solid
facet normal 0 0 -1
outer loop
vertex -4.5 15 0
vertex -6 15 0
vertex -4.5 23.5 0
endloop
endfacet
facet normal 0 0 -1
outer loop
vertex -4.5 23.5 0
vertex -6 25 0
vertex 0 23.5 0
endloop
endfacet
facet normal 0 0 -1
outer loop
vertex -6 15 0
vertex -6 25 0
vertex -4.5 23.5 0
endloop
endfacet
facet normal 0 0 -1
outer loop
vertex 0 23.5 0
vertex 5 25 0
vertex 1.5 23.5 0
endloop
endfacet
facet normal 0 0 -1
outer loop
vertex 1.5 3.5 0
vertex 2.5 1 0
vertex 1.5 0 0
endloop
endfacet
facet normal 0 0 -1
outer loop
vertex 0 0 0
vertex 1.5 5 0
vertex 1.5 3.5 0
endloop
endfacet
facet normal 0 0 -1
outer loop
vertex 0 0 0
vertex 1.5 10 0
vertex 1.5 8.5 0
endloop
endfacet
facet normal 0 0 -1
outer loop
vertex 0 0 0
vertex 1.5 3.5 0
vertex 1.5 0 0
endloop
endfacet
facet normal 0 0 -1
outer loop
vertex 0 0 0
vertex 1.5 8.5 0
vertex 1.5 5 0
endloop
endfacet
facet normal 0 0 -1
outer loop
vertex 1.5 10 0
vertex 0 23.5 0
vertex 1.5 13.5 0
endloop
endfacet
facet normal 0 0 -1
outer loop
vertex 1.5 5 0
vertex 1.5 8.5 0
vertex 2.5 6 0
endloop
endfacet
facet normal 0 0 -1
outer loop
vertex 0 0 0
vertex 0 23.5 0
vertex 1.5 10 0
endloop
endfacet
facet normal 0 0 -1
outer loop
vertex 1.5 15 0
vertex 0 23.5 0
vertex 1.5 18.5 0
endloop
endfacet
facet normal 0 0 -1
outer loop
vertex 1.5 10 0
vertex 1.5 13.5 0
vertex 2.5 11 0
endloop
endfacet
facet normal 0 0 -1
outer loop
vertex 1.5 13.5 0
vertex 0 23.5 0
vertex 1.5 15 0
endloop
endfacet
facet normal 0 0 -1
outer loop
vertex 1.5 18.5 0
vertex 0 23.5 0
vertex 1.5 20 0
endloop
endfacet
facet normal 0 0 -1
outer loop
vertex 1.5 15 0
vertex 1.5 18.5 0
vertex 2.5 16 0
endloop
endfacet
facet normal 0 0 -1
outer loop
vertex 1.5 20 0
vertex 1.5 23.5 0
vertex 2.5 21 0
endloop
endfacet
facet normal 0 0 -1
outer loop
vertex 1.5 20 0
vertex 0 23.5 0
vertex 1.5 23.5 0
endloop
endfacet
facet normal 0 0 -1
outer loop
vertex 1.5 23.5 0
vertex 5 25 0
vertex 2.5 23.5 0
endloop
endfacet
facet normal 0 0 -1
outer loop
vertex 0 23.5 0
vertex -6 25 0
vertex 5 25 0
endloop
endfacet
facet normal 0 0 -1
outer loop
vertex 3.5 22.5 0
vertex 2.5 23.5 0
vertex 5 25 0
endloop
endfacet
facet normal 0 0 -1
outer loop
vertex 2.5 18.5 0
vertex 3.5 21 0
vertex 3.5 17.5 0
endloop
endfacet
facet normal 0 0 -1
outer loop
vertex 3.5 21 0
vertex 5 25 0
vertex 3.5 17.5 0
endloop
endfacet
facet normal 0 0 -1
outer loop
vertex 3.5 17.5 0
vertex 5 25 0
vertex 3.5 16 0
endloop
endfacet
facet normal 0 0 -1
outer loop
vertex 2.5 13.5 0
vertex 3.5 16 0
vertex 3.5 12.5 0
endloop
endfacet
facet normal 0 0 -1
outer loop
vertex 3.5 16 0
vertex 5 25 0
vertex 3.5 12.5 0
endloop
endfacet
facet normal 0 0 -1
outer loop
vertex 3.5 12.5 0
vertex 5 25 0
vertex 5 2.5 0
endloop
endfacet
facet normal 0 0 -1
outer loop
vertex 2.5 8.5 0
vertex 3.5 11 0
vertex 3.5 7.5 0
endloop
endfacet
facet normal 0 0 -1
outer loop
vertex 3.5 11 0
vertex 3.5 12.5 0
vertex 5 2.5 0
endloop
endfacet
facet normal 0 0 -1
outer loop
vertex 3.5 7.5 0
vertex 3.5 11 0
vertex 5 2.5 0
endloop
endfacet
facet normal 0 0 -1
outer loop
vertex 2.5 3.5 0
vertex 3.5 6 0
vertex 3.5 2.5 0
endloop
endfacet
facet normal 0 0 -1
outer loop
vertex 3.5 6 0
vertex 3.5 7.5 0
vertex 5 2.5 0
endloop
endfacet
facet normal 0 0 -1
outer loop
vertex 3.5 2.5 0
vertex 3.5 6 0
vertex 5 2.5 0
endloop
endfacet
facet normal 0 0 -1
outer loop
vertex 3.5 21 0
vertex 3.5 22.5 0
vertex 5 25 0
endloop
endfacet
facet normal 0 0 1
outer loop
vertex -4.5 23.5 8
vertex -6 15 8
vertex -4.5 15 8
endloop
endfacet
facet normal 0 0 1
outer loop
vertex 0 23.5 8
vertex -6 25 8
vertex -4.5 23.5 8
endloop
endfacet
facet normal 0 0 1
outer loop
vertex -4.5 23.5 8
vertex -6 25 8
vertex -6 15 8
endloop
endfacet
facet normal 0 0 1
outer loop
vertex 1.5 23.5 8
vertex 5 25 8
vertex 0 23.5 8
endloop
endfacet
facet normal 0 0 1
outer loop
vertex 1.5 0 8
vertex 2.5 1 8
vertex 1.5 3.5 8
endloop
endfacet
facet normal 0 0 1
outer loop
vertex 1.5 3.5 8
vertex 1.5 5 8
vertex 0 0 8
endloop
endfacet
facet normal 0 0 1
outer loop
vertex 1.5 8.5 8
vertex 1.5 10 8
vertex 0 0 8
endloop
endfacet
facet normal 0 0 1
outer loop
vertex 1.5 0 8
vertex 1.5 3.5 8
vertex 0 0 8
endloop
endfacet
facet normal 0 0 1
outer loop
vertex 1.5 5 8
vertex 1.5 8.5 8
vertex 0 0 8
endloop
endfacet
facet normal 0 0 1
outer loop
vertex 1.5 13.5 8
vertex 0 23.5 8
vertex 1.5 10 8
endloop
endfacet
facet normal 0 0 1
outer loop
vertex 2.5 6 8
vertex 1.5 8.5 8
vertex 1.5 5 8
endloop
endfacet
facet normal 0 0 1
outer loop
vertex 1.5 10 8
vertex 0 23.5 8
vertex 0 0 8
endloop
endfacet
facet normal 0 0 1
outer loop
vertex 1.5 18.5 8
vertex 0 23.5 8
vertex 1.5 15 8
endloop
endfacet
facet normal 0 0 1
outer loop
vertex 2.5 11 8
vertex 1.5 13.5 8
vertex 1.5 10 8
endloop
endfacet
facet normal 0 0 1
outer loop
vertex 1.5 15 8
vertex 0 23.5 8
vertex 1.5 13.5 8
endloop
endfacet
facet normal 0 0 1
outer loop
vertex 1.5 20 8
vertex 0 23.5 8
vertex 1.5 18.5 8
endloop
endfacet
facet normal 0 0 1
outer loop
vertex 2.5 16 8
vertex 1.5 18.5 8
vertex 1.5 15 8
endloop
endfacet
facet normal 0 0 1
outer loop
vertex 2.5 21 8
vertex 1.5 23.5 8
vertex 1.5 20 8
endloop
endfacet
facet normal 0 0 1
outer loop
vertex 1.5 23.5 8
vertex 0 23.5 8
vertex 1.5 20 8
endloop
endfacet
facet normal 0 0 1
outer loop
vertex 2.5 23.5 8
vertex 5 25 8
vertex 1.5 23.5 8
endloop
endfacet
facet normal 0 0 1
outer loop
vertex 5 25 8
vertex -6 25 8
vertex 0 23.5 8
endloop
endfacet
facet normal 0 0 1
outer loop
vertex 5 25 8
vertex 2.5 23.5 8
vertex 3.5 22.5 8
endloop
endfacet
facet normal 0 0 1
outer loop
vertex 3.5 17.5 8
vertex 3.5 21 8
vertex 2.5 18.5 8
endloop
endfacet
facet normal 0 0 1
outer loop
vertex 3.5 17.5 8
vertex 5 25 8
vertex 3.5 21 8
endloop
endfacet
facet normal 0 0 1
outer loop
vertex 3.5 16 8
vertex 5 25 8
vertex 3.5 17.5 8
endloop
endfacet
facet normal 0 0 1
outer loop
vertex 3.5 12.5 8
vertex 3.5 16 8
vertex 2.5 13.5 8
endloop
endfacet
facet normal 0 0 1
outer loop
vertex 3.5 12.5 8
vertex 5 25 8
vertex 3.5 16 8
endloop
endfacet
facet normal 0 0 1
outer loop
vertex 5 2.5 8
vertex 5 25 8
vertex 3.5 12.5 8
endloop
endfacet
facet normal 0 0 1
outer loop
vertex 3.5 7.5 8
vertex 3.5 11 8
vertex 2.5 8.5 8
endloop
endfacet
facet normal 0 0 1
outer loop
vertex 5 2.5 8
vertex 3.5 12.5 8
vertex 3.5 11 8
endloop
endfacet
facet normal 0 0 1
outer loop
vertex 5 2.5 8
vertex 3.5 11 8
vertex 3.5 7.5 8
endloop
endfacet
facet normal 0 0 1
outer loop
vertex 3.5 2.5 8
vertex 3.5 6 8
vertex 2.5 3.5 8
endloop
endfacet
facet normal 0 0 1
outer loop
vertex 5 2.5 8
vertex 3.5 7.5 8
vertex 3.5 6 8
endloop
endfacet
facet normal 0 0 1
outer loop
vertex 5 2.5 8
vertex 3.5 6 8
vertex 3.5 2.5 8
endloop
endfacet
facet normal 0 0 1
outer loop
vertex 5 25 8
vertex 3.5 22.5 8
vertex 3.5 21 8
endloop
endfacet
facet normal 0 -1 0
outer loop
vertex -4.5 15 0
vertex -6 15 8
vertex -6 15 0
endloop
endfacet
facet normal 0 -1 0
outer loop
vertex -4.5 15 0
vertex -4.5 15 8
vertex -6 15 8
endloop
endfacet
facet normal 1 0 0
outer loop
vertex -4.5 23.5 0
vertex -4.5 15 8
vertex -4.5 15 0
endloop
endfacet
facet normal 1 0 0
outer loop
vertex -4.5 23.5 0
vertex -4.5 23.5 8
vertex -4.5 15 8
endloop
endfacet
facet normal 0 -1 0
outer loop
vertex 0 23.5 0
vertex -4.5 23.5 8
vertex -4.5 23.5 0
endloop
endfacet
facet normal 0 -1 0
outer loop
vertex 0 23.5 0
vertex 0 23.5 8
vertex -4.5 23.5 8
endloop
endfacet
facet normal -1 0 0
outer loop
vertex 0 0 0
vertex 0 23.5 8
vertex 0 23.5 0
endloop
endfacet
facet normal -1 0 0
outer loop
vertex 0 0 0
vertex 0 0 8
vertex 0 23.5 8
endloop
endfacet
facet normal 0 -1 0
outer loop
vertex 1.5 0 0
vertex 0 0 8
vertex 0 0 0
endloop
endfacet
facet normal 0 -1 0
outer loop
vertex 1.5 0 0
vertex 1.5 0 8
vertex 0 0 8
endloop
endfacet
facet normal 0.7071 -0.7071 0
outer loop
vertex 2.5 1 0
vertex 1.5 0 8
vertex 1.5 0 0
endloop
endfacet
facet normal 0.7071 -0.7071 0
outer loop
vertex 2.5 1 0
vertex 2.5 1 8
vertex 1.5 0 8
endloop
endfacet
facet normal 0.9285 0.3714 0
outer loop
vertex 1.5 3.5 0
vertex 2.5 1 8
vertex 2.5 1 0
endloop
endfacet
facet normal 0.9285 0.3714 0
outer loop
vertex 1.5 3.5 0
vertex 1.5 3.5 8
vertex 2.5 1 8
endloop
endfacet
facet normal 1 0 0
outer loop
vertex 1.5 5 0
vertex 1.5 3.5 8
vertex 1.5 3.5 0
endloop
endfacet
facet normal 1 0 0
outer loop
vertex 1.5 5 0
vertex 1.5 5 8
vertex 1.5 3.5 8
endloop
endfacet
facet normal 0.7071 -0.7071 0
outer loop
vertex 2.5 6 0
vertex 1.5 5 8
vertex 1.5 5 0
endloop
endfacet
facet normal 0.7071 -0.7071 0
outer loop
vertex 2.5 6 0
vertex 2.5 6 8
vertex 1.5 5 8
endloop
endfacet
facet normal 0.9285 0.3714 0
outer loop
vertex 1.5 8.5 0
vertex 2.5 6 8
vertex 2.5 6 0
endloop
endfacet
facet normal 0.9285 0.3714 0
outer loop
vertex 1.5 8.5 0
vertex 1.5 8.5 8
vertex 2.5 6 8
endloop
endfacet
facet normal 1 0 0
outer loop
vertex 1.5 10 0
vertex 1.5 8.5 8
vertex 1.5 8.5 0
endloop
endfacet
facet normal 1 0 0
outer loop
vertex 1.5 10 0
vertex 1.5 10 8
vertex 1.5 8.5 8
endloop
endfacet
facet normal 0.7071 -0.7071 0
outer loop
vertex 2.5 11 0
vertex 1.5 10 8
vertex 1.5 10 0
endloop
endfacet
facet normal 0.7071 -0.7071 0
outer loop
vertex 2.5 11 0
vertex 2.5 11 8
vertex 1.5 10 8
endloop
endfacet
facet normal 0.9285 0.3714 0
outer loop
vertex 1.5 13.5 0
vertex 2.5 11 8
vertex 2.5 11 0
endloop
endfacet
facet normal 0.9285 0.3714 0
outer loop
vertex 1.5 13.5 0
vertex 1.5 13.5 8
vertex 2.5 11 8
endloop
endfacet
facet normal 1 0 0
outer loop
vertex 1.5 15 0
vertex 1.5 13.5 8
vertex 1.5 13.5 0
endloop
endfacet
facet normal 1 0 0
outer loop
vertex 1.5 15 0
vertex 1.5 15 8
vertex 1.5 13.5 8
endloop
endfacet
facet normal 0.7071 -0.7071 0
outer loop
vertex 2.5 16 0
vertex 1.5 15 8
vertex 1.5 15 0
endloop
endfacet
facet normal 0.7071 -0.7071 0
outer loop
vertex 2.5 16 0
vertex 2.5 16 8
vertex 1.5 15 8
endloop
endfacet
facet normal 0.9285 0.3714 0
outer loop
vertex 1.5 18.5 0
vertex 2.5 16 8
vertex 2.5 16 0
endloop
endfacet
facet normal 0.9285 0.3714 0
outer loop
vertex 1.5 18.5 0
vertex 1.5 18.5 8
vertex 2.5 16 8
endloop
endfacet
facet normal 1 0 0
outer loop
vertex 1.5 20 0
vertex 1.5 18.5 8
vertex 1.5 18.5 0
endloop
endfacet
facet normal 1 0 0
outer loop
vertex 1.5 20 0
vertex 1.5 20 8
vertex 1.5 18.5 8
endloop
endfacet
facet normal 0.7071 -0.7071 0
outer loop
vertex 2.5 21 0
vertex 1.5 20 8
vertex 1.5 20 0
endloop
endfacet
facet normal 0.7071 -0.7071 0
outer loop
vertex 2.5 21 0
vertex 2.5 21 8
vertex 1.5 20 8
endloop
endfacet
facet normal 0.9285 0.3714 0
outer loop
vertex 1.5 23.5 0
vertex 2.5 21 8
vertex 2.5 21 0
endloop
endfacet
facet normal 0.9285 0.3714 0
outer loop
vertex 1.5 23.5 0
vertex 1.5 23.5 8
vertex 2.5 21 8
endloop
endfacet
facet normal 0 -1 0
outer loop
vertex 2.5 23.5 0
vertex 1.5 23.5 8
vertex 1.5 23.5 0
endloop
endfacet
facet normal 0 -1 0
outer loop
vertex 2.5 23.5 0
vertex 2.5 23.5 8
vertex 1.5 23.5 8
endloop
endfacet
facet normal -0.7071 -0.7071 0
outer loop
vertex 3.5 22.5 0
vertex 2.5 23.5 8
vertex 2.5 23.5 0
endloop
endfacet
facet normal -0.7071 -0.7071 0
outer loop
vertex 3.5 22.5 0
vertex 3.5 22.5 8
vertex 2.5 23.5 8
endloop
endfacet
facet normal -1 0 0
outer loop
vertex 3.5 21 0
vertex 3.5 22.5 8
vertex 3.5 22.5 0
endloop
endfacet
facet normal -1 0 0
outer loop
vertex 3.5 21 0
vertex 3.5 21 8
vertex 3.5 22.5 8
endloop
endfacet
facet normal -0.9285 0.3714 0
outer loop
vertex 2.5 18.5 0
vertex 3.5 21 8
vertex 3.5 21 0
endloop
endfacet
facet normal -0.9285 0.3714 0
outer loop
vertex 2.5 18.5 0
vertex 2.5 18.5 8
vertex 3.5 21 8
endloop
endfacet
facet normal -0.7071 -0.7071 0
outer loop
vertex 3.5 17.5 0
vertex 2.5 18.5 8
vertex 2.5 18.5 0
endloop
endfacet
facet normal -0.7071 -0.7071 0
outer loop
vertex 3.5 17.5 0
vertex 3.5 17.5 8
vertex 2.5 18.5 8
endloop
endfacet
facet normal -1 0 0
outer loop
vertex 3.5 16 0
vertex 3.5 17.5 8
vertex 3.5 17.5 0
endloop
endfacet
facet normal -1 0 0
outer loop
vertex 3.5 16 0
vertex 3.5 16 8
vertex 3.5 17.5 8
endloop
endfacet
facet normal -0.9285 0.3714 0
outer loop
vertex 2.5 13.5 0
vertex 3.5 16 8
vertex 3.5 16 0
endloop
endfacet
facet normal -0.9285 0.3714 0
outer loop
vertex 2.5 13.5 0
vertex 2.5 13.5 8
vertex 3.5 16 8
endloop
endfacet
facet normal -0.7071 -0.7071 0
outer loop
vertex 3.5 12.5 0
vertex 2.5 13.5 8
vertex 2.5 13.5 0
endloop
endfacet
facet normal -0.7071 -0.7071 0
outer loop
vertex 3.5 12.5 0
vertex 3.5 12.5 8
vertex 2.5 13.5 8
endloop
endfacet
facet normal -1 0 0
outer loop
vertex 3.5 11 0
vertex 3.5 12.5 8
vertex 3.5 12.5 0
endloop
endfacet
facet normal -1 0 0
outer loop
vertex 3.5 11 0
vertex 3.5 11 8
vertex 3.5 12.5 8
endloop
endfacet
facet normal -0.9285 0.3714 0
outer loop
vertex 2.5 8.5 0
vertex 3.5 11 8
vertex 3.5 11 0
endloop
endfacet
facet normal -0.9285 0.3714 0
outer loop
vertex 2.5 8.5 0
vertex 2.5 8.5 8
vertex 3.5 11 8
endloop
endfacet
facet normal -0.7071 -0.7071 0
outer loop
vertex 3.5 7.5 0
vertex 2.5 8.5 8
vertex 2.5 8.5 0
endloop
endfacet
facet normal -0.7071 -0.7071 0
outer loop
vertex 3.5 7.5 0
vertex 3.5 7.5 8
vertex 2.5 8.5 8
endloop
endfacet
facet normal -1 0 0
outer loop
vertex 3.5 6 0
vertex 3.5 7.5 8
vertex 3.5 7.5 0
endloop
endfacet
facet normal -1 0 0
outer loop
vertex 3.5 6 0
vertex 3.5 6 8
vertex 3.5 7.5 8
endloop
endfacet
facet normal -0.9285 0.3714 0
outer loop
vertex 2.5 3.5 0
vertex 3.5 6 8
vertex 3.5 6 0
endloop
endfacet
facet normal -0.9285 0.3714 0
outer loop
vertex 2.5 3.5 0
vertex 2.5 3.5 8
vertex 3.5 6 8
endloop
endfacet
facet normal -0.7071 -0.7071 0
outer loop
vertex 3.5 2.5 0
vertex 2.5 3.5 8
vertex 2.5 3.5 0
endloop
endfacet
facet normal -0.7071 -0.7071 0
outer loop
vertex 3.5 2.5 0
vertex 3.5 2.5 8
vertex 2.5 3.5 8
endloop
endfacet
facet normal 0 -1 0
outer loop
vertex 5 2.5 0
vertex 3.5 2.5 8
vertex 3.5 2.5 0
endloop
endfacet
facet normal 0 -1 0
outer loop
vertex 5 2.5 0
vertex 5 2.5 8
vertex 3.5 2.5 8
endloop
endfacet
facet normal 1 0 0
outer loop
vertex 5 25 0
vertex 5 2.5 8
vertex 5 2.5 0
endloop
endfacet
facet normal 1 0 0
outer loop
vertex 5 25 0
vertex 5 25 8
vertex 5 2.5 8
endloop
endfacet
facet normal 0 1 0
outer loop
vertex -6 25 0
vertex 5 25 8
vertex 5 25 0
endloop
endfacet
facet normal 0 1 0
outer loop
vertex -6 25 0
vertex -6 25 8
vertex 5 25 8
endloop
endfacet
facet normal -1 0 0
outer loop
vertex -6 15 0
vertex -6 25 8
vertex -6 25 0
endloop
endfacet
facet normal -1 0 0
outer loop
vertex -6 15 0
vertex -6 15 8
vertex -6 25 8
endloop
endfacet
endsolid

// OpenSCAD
tn=1.5;         // Épaisseur
d=5;            // Nombre de dents
ds=5;           // Taille d'une dent
l=3;            // Largeur du crochet
c=10;           // Hauteur du crochet

hauteur=8;      // Haureur de la pièce


module triangle(x){
    square([tn,ds]);
    translate([tn,0,0]) polygon([[0,0], [0,x-tn], [(x/2)-tn,(x/2)-tn]]);
}
module ds(nb, x=10)
    for(i = [0:1:nb-1]){
        translate([0,x*i,0]) triangle(x);
}

module pincette(d, ds){
    difference(){
        union(){
            translate([0,d*ds-tn,0]) square([ds,tn]);
            ds(d,ds);
            mirror([1,0,0]) translate([-ds,ds/2,0]) ds(d,ds);
        }
        translate([0,d*ds,0]) square([ds,ds/2]);
    }
}

module cchet(){
    //square([tn,ds*d]);
    translate([0,ds*d-tn,0]) square([l+tn,tn]);
    translate([l+tn,ds*d-c,0]) square([tn,c]);
}

linear_extrude(hauteur) {
    mirror([1,0,0]) cchet();
    pincette(d,ds);
}


// vim: ft=openscad tw=100 noet ts=4 sw=4
